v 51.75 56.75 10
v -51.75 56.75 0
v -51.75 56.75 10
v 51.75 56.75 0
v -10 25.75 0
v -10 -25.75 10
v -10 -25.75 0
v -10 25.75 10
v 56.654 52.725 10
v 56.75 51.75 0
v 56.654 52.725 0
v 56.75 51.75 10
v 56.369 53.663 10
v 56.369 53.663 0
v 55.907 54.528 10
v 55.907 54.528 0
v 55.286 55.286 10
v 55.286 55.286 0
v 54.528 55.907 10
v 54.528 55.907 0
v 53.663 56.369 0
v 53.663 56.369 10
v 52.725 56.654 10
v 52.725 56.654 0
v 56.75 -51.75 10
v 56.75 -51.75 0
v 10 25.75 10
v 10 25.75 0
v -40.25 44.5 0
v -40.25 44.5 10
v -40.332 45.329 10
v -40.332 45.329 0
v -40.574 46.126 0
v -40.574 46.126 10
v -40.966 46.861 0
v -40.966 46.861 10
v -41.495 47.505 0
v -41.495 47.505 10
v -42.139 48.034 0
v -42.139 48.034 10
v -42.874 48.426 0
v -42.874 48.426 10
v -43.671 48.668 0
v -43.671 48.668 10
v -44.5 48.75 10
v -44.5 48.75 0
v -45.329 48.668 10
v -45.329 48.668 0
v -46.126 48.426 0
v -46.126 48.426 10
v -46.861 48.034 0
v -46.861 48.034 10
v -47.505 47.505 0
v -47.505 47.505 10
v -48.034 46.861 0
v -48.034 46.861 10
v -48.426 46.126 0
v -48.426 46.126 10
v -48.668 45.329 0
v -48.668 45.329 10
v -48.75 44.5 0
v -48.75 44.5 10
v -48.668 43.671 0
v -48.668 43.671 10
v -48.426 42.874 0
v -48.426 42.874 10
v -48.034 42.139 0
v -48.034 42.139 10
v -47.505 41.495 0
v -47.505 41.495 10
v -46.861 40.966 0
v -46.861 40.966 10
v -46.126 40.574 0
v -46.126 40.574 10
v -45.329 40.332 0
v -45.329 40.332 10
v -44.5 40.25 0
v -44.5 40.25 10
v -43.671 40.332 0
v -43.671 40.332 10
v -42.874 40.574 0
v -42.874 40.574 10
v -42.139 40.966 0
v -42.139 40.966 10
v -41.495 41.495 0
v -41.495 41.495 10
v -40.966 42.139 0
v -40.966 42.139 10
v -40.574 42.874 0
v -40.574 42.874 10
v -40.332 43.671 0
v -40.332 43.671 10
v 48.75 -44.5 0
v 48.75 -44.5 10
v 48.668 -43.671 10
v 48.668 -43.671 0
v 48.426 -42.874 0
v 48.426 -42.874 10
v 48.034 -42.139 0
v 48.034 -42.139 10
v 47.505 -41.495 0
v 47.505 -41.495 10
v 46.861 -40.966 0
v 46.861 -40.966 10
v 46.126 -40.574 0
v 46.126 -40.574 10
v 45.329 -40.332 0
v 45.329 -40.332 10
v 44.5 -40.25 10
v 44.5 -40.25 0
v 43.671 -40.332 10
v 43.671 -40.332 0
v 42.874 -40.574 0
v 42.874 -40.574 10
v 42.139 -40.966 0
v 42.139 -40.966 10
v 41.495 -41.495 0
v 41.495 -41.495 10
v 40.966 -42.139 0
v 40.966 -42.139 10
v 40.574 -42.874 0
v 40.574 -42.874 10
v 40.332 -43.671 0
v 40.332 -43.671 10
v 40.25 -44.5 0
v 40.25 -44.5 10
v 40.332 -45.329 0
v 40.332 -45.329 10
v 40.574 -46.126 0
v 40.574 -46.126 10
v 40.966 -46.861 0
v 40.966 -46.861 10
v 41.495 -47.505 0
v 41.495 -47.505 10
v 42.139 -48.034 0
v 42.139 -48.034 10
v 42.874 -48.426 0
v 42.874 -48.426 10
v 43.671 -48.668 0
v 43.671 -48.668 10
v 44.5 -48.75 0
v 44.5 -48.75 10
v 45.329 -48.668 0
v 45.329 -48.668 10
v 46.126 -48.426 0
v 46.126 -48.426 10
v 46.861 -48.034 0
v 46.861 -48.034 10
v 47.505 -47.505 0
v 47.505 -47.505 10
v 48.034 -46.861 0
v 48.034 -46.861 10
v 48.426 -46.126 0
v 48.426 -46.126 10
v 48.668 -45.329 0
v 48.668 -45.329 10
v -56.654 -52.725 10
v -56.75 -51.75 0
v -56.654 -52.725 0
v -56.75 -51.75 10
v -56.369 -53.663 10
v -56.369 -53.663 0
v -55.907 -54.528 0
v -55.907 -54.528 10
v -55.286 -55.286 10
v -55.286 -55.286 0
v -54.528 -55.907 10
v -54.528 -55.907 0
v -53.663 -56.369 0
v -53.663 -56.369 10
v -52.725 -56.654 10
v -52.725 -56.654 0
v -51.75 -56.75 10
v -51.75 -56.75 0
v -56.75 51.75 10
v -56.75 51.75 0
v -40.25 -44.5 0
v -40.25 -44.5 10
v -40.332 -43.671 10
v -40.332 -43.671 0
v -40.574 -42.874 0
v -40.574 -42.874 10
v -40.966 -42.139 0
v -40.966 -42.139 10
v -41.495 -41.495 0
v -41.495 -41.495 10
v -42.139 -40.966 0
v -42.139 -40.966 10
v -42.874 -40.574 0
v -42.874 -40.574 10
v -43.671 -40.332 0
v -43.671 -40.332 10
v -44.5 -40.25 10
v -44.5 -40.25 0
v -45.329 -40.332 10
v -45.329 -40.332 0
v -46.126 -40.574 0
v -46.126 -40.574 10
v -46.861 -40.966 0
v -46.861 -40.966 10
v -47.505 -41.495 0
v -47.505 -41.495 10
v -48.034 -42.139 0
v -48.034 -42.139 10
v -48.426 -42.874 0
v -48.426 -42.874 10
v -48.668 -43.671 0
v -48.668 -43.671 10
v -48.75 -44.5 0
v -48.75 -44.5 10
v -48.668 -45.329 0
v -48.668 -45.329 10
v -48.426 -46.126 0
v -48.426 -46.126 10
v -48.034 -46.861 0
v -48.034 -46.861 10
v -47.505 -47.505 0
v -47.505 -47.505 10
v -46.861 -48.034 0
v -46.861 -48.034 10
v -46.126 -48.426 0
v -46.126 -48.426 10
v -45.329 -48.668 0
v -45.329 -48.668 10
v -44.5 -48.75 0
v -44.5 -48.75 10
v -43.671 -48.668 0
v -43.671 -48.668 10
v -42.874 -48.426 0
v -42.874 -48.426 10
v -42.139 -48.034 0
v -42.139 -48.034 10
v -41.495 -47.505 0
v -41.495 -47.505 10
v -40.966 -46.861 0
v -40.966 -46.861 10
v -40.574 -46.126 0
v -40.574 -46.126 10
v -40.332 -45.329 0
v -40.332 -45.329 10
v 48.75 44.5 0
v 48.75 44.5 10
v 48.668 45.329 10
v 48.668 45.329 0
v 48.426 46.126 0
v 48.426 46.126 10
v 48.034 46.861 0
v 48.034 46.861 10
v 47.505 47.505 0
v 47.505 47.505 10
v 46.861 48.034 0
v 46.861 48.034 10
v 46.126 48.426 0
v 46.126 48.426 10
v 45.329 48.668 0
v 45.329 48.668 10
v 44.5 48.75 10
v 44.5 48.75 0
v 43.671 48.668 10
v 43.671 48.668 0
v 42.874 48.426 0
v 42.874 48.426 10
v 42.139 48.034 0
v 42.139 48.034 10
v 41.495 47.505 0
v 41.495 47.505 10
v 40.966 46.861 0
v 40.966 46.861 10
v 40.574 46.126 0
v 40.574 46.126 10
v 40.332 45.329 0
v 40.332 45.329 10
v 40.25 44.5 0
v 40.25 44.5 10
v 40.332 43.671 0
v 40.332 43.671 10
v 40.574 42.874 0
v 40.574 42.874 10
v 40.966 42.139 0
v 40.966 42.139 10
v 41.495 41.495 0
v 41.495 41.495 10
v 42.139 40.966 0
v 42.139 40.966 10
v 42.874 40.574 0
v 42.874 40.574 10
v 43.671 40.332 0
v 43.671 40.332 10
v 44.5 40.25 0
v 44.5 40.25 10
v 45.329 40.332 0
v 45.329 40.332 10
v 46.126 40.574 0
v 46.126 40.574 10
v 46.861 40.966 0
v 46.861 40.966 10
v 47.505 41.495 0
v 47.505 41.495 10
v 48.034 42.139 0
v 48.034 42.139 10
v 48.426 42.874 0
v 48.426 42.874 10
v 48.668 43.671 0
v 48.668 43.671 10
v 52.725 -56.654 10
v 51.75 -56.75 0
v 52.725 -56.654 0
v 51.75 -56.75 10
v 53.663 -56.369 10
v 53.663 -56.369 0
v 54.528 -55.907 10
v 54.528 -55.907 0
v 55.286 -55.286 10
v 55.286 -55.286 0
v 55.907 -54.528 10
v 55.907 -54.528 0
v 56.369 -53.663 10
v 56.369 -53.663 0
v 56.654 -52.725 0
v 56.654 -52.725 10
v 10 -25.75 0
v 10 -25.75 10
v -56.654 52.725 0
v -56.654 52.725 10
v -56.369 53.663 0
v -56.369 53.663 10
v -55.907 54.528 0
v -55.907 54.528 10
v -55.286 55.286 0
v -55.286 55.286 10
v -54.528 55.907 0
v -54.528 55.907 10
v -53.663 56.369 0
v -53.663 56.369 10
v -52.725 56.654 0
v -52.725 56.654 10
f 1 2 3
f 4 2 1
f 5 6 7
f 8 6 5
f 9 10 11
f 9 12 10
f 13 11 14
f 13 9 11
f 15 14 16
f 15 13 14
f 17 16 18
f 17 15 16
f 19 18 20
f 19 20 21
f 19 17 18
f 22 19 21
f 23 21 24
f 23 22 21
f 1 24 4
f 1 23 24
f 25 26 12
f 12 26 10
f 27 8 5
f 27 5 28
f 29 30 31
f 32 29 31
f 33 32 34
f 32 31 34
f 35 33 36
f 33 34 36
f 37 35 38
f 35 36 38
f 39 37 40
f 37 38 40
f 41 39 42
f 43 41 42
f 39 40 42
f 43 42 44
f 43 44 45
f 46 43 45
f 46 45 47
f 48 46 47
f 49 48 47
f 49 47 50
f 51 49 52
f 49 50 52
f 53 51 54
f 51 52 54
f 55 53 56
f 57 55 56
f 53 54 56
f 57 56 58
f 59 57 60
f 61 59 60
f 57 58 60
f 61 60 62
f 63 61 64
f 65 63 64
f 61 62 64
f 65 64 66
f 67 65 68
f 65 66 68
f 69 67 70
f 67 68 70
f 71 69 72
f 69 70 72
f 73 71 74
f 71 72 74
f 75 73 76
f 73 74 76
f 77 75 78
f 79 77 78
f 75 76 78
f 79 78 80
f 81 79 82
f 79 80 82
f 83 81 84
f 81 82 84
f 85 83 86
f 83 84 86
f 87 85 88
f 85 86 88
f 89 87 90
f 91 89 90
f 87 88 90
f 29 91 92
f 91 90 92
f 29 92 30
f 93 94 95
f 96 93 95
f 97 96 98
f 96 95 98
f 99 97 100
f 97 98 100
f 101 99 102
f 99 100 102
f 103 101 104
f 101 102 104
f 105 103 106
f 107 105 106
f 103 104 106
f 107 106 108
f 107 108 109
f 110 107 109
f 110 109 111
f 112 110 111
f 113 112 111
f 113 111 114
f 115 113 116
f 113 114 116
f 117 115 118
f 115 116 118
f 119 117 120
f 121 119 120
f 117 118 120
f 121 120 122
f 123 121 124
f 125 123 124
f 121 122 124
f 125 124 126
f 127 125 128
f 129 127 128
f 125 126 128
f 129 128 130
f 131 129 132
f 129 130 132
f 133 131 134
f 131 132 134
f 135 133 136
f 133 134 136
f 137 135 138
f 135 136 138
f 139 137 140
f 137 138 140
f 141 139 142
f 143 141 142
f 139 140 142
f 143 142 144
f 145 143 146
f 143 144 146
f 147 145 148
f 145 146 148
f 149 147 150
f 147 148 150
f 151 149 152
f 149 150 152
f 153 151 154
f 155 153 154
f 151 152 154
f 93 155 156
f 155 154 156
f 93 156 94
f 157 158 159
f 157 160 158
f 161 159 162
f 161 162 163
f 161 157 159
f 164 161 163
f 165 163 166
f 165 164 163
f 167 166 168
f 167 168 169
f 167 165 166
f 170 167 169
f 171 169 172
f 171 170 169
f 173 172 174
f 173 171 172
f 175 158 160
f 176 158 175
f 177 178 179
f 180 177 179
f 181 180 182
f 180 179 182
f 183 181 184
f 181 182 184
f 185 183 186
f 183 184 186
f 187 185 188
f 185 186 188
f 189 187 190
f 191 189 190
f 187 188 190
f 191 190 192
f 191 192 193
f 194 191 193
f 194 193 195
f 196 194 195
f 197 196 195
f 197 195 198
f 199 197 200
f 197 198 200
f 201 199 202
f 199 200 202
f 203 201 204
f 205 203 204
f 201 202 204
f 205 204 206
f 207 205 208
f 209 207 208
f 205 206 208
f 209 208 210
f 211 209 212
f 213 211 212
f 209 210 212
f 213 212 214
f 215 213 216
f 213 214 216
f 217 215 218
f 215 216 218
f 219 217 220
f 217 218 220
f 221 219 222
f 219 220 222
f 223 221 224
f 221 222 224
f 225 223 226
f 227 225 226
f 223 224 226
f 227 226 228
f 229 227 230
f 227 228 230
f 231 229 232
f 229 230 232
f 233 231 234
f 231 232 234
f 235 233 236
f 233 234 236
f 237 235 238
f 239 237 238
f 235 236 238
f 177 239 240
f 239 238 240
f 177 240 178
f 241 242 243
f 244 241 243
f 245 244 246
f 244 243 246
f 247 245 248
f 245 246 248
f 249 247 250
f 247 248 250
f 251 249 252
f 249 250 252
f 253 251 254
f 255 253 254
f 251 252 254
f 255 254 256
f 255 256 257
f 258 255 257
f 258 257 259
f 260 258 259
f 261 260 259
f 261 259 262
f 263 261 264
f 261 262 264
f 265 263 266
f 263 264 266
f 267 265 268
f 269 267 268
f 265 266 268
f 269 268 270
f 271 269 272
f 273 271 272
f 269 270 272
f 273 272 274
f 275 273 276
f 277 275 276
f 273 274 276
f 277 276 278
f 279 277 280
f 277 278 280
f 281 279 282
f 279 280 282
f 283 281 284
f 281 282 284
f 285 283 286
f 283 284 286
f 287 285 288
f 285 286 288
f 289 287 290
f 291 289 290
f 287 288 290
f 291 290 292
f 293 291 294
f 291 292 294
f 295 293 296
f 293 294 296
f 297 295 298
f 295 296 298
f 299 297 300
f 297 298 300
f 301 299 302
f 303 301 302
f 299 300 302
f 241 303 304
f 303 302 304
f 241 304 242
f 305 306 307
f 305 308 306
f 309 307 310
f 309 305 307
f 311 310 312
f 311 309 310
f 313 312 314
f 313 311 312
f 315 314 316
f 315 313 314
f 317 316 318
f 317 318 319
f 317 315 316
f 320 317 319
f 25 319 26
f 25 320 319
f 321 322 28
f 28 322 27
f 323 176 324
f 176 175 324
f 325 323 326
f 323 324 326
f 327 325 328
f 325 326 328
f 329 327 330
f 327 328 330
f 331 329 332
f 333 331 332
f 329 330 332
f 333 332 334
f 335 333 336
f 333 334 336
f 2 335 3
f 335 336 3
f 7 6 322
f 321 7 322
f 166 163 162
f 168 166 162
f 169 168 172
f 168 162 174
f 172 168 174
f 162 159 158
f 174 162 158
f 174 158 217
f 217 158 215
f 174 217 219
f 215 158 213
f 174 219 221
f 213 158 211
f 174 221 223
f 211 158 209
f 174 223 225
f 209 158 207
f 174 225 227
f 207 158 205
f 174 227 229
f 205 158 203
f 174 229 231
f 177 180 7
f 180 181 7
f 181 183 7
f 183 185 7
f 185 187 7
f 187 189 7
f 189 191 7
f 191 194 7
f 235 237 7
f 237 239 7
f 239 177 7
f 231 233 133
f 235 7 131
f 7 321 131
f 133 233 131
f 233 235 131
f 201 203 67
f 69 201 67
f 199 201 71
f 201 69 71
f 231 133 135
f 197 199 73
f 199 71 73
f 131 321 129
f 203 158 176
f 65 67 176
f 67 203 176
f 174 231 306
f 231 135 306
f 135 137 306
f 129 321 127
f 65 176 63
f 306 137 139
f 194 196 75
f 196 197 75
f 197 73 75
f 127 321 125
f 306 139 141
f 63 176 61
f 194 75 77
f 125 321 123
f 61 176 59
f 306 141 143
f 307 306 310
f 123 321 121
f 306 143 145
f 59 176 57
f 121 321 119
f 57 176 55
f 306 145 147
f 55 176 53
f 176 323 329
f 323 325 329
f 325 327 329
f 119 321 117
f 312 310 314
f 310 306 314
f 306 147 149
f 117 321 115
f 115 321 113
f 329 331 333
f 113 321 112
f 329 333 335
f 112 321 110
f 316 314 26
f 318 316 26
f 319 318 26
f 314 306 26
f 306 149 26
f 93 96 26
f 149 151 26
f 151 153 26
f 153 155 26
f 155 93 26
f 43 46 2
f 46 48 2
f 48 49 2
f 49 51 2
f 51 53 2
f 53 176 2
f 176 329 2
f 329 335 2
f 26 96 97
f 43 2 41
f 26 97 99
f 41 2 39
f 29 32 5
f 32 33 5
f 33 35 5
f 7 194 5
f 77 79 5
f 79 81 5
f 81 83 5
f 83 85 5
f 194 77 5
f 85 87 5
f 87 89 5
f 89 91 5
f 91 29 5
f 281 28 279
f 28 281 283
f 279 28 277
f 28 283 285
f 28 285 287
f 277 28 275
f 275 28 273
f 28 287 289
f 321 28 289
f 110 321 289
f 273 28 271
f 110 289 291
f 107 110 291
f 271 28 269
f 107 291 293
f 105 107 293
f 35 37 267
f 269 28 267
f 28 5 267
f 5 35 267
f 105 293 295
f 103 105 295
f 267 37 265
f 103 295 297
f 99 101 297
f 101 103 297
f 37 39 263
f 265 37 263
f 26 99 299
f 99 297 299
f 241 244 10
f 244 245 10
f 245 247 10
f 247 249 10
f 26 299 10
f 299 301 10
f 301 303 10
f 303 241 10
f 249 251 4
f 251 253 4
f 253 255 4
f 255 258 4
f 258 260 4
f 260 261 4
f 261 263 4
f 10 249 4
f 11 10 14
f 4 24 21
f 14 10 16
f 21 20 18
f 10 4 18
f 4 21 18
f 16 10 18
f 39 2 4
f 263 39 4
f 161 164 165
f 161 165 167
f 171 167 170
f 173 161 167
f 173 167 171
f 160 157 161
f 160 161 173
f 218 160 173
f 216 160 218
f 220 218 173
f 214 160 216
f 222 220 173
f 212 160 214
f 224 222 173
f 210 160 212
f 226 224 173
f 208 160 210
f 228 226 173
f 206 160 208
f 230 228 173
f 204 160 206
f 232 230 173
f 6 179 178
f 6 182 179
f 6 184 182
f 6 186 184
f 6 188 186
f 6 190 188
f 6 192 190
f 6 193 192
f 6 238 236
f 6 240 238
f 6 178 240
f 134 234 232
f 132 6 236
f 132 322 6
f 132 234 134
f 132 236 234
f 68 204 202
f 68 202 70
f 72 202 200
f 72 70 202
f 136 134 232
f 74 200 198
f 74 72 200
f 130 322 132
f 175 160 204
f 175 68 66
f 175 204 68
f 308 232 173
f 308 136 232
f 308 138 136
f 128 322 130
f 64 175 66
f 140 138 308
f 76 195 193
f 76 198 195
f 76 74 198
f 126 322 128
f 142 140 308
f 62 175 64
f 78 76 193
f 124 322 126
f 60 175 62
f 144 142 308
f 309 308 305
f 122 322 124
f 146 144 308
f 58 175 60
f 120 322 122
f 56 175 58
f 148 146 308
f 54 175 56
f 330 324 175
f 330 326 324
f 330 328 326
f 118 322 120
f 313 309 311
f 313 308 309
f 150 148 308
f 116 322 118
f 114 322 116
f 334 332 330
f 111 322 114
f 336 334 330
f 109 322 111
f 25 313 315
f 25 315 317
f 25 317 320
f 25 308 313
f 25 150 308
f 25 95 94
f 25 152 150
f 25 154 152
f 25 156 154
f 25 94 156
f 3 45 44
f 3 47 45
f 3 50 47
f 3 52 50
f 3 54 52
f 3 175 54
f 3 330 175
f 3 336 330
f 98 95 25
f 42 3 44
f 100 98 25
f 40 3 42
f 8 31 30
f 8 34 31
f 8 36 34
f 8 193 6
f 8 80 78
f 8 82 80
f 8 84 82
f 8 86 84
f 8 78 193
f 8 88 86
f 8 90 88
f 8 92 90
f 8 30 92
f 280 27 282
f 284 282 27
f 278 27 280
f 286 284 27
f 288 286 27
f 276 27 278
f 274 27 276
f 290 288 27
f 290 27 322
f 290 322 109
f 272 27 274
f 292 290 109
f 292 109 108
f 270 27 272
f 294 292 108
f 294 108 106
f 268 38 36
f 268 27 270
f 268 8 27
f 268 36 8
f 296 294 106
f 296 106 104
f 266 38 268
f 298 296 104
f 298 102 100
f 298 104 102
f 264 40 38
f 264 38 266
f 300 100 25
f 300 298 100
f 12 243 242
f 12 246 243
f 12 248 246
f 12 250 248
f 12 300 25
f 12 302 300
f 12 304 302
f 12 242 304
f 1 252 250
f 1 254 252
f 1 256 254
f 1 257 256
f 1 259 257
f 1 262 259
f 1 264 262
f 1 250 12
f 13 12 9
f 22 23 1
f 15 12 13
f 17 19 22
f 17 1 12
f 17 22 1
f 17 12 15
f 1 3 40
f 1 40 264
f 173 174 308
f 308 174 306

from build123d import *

# Parameters (mm, degrees)
F0_W     = 113.5
F0_H     = 113.5
F1_DEPTH = 10
F2_R     = 5
F3_R     = 4.25
F4_DEPTH = 10
F5_W     = 20
F5_H     = 51.5
F6_DEPTH = 10


with BuildPart() as f1:
    # F0 (on Top) → F1 (new body)
    with BuildSketch(Plane.XY):
        Rectangle(F0_W, F0_H)
    extrude(amount=F1_DEPTH)

    # F2
    f2_edges = [f1.edges().sort_by_distance(p)[0] for p in [
        (-56.75, -56.75, 5),
        (-56.75, 56.75, 5),
        (56.75, 56.75, 5),
        (56.75, -56.75, 5),
    ]]
    fillet(f2_edges, radius=F2_R)

    # F3 (on face) → F4 (cut)
    with BuildSketch(Plane.XY.offset(10)):
        with Locations((-44.5, -44.5)):
            Circle(F3_R)
        with Locations((44.5, -44.5)):
            Circle(F3_R)
        with Locations((-44.5, 44.5)):
            Circle(F3_R)
        with Locations((44.5, 44.5)):
            Circle(F3_R)
    extrude(amount=-F4_DEPTH, mode=Mode.SUBTRACT)

    # F5 (on face) → F6 (cut)
    with BuildSketch(Plane.XY.offset(10)):
        Rectangle(F5_W, F5_H)
    extrude(amount=-F6_DEPTH, mode=Mode.SUBTRACT)


solid = f1.part
